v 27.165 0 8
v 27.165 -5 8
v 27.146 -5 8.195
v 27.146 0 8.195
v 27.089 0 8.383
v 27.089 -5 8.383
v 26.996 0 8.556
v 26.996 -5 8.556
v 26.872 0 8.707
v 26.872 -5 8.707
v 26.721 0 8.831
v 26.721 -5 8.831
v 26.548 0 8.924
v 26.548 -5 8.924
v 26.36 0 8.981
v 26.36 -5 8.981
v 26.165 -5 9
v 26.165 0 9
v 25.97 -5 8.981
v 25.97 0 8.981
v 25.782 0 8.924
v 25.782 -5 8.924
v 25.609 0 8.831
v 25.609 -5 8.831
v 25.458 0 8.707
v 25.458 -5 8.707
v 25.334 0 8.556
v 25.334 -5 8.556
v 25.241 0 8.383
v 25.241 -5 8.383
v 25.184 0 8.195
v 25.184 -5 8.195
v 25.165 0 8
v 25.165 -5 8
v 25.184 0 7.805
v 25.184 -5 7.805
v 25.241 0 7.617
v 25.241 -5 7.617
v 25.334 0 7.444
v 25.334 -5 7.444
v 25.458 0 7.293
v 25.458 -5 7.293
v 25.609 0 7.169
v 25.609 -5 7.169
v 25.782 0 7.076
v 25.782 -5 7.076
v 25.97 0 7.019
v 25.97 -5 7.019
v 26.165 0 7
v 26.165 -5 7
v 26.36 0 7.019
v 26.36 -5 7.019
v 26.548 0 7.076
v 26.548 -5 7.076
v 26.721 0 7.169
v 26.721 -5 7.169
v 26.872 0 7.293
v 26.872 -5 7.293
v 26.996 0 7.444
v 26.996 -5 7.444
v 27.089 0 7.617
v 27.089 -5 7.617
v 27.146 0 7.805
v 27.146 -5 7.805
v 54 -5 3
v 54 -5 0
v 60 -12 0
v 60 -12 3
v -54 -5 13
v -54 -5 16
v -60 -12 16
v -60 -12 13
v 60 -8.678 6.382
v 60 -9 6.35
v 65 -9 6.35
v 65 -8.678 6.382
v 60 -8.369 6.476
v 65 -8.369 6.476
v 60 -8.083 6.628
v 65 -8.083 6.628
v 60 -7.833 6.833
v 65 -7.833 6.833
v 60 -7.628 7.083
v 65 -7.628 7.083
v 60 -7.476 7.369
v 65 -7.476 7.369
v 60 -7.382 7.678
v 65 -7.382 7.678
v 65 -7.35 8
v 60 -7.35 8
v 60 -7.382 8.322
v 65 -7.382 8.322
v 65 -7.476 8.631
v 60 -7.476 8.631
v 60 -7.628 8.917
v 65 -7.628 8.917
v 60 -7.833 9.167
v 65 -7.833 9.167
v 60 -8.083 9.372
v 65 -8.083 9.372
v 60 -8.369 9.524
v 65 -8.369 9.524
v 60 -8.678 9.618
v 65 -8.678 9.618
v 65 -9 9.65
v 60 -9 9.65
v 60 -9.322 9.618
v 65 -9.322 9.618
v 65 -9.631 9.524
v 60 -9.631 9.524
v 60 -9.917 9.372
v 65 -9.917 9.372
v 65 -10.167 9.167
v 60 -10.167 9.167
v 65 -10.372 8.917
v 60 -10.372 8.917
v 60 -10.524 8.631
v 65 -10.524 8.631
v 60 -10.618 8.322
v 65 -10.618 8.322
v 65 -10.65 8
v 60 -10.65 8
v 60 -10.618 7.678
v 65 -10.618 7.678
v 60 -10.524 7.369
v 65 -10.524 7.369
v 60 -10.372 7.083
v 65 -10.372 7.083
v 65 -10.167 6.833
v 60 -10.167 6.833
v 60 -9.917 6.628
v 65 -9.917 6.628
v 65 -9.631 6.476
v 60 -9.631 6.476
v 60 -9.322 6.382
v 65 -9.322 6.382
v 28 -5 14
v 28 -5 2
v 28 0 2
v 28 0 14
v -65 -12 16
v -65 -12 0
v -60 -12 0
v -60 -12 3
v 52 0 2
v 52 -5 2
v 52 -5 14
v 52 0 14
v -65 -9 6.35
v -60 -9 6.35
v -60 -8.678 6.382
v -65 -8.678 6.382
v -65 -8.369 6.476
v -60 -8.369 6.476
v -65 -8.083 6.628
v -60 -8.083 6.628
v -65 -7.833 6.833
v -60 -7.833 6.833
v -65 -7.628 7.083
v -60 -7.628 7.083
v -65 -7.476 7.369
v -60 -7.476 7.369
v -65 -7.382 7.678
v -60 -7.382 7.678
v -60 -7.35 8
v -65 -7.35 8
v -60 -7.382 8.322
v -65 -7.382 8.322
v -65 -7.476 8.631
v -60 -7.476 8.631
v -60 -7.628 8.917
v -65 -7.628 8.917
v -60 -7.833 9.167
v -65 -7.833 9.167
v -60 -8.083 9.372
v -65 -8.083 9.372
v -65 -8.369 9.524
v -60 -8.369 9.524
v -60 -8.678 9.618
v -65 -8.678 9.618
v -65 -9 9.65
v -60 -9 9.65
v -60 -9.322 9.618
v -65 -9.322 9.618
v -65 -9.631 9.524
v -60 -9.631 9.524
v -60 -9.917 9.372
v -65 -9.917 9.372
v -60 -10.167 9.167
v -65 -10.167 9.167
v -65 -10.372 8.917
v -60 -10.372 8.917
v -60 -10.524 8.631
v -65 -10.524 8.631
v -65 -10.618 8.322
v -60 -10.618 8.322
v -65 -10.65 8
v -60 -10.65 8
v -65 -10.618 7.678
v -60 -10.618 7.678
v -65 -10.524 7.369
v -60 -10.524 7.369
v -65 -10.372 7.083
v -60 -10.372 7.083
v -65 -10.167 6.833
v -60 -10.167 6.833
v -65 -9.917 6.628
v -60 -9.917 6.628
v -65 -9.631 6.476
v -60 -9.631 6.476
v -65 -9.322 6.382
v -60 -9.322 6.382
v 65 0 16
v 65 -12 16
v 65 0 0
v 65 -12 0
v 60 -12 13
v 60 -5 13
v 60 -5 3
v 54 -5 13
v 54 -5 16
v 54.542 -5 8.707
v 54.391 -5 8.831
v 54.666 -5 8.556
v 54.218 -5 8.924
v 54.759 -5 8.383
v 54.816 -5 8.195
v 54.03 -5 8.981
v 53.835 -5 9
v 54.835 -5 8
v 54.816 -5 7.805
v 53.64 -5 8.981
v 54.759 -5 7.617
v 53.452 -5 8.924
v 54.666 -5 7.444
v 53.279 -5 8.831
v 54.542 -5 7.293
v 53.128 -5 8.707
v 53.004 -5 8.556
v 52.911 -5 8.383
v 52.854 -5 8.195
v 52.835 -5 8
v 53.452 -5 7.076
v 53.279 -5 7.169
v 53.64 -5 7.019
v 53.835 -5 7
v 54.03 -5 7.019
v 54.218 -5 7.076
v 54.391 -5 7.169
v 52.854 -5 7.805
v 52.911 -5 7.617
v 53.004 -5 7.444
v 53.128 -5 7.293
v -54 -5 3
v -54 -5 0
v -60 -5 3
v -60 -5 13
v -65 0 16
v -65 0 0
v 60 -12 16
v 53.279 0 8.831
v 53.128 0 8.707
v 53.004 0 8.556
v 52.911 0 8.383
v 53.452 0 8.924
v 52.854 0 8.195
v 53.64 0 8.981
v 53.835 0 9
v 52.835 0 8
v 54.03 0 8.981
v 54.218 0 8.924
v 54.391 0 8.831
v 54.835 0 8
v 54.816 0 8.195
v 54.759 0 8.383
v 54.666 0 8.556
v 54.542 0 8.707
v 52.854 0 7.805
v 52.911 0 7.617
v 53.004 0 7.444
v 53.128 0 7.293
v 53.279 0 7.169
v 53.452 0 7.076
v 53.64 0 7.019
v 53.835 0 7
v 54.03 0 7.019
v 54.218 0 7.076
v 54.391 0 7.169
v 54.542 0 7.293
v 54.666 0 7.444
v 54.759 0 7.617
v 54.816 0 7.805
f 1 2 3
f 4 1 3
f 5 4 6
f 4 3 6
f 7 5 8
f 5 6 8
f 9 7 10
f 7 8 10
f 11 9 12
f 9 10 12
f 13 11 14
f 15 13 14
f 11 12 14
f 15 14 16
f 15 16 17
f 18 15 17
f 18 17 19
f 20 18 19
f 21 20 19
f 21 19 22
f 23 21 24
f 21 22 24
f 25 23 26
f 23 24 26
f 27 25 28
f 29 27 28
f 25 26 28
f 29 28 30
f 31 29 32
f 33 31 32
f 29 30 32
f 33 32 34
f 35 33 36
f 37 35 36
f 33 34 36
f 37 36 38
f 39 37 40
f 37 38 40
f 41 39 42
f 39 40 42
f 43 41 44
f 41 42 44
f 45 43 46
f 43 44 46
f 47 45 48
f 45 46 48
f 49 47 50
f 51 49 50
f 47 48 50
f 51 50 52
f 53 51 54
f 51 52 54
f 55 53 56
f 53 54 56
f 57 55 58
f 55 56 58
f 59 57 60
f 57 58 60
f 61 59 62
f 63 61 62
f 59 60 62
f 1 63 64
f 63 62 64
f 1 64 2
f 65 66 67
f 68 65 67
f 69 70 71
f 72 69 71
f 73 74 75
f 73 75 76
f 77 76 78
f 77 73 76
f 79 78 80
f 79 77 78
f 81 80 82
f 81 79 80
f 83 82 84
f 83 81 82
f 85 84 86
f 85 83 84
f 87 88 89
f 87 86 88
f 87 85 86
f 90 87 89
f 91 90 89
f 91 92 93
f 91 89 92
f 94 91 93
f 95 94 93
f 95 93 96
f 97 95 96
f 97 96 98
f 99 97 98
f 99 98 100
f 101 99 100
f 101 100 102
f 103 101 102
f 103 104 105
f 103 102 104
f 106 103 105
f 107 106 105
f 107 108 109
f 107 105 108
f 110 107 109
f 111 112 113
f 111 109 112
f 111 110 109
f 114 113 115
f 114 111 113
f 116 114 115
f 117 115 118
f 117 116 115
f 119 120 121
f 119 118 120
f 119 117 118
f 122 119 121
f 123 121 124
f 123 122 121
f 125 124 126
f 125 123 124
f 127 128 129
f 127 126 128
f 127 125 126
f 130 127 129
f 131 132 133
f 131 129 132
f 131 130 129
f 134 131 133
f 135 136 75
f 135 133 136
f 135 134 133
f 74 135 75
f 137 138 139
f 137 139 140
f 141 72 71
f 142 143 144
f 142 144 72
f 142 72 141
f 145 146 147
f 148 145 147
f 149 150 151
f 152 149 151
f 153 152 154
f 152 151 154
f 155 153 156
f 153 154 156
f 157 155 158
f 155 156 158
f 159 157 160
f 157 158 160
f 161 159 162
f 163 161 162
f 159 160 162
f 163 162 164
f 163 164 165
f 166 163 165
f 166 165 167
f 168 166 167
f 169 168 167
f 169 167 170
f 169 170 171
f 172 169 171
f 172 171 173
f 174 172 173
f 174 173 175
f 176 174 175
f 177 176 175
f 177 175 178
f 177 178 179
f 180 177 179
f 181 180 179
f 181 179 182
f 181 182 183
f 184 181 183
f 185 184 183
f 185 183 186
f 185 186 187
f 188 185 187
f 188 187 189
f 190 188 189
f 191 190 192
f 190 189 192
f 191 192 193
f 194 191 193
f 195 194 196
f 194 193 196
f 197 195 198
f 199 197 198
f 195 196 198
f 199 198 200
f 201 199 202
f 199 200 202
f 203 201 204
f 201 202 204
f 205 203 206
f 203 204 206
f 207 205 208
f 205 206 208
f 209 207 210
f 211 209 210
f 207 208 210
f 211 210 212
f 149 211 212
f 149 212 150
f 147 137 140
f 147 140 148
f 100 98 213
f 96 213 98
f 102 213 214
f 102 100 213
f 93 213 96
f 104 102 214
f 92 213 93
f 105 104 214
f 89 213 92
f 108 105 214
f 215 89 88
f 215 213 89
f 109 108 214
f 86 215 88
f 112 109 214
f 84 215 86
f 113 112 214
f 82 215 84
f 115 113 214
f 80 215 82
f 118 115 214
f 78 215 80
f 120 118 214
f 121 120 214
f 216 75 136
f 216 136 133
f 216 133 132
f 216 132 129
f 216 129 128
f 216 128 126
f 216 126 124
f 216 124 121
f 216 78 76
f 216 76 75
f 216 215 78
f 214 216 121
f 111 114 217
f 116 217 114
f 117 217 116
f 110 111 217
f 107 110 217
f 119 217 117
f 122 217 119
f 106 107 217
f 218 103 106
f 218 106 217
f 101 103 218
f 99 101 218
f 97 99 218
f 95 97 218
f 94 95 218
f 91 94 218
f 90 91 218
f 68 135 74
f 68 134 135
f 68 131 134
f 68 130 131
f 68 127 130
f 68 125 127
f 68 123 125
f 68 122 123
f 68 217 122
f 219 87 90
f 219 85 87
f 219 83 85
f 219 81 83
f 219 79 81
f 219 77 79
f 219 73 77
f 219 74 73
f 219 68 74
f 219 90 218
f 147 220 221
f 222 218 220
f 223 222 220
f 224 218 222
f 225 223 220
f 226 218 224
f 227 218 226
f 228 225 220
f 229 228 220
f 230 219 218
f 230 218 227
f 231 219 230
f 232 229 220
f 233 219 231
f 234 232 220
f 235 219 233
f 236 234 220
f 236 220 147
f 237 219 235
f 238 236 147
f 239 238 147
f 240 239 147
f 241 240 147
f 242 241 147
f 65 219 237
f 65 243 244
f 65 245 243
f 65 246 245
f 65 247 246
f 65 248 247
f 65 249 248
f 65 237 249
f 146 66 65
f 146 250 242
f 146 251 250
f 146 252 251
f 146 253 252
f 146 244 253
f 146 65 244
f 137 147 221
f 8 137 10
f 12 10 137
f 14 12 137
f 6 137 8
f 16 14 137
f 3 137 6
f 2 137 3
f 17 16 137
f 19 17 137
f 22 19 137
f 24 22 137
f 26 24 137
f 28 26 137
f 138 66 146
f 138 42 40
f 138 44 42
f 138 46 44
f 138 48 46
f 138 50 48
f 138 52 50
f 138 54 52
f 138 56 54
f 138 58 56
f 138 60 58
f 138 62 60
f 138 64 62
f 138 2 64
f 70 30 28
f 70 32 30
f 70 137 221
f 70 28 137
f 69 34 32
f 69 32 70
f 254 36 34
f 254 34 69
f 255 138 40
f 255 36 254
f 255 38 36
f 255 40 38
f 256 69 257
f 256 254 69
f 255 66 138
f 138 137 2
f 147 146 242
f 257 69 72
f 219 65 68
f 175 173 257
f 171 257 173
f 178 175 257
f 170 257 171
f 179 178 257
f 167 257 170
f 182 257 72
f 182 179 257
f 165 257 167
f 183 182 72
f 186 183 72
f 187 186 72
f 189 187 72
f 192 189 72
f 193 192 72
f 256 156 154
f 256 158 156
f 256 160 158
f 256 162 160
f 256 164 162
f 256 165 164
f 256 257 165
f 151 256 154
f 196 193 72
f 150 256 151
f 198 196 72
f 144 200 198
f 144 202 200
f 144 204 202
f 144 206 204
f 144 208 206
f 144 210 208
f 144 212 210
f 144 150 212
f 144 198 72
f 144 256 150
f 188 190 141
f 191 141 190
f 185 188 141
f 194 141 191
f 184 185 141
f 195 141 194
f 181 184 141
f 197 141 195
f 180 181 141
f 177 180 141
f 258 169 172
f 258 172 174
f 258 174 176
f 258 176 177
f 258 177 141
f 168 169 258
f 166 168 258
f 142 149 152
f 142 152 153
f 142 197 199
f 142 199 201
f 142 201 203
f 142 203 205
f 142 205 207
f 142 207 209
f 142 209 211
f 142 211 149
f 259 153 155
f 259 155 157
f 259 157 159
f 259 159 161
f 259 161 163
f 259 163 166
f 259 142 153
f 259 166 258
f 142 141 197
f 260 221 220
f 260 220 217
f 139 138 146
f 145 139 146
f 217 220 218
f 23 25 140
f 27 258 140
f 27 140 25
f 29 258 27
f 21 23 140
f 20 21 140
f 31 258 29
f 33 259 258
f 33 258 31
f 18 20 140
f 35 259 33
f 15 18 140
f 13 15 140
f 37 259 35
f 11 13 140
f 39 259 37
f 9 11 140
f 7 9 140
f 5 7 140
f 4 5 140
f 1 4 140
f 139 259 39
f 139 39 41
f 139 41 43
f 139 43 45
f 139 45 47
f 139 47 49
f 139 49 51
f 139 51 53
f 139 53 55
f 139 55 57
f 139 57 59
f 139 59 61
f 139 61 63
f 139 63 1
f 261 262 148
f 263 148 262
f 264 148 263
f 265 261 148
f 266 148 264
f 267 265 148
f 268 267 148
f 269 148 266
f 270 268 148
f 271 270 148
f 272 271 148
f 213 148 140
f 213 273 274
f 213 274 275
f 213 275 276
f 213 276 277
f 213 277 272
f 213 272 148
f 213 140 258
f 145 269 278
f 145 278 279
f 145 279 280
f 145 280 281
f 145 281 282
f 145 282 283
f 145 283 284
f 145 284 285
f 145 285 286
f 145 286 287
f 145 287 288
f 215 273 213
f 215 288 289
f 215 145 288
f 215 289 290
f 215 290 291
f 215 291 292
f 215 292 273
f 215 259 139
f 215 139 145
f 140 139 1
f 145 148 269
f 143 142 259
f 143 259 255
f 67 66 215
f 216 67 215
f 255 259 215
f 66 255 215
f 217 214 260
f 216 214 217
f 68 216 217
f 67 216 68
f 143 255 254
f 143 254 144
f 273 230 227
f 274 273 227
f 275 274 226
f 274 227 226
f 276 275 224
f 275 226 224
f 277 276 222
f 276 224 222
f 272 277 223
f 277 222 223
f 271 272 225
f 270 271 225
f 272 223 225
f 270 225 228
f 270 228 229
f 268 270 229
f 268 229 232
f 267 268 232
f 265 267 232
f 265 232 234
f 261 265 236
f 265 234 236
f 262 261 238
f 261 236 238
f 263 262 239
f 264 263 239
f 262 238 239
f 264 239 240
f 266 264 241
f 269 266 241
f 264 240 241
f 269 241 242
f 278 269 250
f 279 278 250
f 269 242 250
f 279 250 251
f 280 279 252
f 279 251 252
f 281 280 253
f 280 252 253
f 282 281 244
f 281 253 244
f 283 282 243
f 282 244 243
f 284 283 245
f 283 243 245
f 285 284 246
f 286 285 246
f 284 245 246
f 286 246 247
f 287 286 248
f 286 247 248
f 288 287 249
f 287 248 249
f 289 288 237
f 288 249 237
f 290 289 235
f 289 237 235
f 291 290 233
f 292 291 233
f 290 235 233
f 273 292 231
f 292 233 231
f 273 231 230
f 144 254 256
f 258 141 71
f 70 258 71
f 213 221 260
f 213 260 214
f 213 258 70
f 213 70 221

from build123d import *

# Parameters (mm, degrees)
EXTRUDE_2_DEPTH          = 16
SKETCH_3_R               = 1.65
CUT_EXTRUDE_1_DEPTH      = 126
CUT_EXTRUDE_1_DEPTH_BACK = 6
EXTRUDE_3_DEPTH          = 3
MIRROR_2_COPY_1_DEPTH    = 3
SKETCH_7_W               = 24
SKETCH_7_H               = 12
CUT_EXTRUDE_2_DEPTH      = 5
SKETCH_10_R              = 1
CUT_EXTRUDE_3_DEPTH      = 5


with BuildPart() as part:
    # 草图1 → 凸台-拉伸2 (new body)
    with BuildSketch(Plane.XY):
        Polygon((-65, 0), (65, 0), (65, -12), (60, -12), (60, -5), (-60, -5), (-60, -12), (-65, -12), align=None)
    extrude(amount=EXTRUDE_2_DEPTH)

    # 草图3 → 切除-拉伸1 (cut, two sides)
    with BuildSketch(Plane(origin=(-60, 0, 0), x_dir=(0, 0, -1), z_dir=(1, 0, 0))) as cut_extrude_1_sk:
        with Locations((-8, -9)):
            Circle(SKETCH_3_R)
    extrude(amount=CUT_EXTRUDE_1_DEPTH, mode=Mode.SUBTRACT)
    extrude(cut_extrude_1_sk.sketch, amount=-CUT_EXTRUDE_1_DEPTH_BACK, mode=Mode.SUBTRACT)

    # 草图4 → 凸台-拉伸3 (add)
    with BuildSketch(Plane(origin=(0, 0, 0), x_dir=(-1, 0, 0), z_dir=(0, 0, -1))):
        Polygon((54, -5), (60, -12), (60, -5), align=None)
    extrude_3 = extrude(amount=-EXTRUDE_3_DEPTH)

    # 镜向1: 凸台-拉伸3 across plane
    add(extrude_3.mirror(Plane.XY.offset(8)))

    # 镜向2: 凸台-拉伸3 across plane
    add(extrude_3.mirror(Plane(origin=(0, 0, 0), x_dir=(0, 0, 1), z_dir=(1, 0, 0))))

    # 镜向2 copy 1 sketch → 镜向2 copy 1 (add)
    with BuildSketch(Plane.XY.offset(16)):
        Polygon((54, -5), (60, -12), (60, -5), align=None)
    extrude(amount=-MIRROR_2_COPY_1_DEPTH)

    # 草图7 → 切除-拉伸2 (cut)
    with BuildSketch(Plane.XZ.offset(5)):
        with Locations((40, 8)):
            Rectangle(SKETCH_7_W, SKETCH_7_H)
    extrude(amount=-CUT_EXTRUDE_2_DEPTH, mode=Mode.SUBTRACT)

    # 草图10 → 切除-拉伸3 (cut)
    with BuildSketch(Plane.XZ.offset(5)):
        with Locations((53.835, 8)):
            Circle(SKETCH_10_R)
        with Locations((26.165, 8)):
            Circle(SKETCH_10_R)
    extrude(amount=-CUT_EXTRUDE_3_DEPTH, mode=Mode.SUBTRACT)


solid = part.part
